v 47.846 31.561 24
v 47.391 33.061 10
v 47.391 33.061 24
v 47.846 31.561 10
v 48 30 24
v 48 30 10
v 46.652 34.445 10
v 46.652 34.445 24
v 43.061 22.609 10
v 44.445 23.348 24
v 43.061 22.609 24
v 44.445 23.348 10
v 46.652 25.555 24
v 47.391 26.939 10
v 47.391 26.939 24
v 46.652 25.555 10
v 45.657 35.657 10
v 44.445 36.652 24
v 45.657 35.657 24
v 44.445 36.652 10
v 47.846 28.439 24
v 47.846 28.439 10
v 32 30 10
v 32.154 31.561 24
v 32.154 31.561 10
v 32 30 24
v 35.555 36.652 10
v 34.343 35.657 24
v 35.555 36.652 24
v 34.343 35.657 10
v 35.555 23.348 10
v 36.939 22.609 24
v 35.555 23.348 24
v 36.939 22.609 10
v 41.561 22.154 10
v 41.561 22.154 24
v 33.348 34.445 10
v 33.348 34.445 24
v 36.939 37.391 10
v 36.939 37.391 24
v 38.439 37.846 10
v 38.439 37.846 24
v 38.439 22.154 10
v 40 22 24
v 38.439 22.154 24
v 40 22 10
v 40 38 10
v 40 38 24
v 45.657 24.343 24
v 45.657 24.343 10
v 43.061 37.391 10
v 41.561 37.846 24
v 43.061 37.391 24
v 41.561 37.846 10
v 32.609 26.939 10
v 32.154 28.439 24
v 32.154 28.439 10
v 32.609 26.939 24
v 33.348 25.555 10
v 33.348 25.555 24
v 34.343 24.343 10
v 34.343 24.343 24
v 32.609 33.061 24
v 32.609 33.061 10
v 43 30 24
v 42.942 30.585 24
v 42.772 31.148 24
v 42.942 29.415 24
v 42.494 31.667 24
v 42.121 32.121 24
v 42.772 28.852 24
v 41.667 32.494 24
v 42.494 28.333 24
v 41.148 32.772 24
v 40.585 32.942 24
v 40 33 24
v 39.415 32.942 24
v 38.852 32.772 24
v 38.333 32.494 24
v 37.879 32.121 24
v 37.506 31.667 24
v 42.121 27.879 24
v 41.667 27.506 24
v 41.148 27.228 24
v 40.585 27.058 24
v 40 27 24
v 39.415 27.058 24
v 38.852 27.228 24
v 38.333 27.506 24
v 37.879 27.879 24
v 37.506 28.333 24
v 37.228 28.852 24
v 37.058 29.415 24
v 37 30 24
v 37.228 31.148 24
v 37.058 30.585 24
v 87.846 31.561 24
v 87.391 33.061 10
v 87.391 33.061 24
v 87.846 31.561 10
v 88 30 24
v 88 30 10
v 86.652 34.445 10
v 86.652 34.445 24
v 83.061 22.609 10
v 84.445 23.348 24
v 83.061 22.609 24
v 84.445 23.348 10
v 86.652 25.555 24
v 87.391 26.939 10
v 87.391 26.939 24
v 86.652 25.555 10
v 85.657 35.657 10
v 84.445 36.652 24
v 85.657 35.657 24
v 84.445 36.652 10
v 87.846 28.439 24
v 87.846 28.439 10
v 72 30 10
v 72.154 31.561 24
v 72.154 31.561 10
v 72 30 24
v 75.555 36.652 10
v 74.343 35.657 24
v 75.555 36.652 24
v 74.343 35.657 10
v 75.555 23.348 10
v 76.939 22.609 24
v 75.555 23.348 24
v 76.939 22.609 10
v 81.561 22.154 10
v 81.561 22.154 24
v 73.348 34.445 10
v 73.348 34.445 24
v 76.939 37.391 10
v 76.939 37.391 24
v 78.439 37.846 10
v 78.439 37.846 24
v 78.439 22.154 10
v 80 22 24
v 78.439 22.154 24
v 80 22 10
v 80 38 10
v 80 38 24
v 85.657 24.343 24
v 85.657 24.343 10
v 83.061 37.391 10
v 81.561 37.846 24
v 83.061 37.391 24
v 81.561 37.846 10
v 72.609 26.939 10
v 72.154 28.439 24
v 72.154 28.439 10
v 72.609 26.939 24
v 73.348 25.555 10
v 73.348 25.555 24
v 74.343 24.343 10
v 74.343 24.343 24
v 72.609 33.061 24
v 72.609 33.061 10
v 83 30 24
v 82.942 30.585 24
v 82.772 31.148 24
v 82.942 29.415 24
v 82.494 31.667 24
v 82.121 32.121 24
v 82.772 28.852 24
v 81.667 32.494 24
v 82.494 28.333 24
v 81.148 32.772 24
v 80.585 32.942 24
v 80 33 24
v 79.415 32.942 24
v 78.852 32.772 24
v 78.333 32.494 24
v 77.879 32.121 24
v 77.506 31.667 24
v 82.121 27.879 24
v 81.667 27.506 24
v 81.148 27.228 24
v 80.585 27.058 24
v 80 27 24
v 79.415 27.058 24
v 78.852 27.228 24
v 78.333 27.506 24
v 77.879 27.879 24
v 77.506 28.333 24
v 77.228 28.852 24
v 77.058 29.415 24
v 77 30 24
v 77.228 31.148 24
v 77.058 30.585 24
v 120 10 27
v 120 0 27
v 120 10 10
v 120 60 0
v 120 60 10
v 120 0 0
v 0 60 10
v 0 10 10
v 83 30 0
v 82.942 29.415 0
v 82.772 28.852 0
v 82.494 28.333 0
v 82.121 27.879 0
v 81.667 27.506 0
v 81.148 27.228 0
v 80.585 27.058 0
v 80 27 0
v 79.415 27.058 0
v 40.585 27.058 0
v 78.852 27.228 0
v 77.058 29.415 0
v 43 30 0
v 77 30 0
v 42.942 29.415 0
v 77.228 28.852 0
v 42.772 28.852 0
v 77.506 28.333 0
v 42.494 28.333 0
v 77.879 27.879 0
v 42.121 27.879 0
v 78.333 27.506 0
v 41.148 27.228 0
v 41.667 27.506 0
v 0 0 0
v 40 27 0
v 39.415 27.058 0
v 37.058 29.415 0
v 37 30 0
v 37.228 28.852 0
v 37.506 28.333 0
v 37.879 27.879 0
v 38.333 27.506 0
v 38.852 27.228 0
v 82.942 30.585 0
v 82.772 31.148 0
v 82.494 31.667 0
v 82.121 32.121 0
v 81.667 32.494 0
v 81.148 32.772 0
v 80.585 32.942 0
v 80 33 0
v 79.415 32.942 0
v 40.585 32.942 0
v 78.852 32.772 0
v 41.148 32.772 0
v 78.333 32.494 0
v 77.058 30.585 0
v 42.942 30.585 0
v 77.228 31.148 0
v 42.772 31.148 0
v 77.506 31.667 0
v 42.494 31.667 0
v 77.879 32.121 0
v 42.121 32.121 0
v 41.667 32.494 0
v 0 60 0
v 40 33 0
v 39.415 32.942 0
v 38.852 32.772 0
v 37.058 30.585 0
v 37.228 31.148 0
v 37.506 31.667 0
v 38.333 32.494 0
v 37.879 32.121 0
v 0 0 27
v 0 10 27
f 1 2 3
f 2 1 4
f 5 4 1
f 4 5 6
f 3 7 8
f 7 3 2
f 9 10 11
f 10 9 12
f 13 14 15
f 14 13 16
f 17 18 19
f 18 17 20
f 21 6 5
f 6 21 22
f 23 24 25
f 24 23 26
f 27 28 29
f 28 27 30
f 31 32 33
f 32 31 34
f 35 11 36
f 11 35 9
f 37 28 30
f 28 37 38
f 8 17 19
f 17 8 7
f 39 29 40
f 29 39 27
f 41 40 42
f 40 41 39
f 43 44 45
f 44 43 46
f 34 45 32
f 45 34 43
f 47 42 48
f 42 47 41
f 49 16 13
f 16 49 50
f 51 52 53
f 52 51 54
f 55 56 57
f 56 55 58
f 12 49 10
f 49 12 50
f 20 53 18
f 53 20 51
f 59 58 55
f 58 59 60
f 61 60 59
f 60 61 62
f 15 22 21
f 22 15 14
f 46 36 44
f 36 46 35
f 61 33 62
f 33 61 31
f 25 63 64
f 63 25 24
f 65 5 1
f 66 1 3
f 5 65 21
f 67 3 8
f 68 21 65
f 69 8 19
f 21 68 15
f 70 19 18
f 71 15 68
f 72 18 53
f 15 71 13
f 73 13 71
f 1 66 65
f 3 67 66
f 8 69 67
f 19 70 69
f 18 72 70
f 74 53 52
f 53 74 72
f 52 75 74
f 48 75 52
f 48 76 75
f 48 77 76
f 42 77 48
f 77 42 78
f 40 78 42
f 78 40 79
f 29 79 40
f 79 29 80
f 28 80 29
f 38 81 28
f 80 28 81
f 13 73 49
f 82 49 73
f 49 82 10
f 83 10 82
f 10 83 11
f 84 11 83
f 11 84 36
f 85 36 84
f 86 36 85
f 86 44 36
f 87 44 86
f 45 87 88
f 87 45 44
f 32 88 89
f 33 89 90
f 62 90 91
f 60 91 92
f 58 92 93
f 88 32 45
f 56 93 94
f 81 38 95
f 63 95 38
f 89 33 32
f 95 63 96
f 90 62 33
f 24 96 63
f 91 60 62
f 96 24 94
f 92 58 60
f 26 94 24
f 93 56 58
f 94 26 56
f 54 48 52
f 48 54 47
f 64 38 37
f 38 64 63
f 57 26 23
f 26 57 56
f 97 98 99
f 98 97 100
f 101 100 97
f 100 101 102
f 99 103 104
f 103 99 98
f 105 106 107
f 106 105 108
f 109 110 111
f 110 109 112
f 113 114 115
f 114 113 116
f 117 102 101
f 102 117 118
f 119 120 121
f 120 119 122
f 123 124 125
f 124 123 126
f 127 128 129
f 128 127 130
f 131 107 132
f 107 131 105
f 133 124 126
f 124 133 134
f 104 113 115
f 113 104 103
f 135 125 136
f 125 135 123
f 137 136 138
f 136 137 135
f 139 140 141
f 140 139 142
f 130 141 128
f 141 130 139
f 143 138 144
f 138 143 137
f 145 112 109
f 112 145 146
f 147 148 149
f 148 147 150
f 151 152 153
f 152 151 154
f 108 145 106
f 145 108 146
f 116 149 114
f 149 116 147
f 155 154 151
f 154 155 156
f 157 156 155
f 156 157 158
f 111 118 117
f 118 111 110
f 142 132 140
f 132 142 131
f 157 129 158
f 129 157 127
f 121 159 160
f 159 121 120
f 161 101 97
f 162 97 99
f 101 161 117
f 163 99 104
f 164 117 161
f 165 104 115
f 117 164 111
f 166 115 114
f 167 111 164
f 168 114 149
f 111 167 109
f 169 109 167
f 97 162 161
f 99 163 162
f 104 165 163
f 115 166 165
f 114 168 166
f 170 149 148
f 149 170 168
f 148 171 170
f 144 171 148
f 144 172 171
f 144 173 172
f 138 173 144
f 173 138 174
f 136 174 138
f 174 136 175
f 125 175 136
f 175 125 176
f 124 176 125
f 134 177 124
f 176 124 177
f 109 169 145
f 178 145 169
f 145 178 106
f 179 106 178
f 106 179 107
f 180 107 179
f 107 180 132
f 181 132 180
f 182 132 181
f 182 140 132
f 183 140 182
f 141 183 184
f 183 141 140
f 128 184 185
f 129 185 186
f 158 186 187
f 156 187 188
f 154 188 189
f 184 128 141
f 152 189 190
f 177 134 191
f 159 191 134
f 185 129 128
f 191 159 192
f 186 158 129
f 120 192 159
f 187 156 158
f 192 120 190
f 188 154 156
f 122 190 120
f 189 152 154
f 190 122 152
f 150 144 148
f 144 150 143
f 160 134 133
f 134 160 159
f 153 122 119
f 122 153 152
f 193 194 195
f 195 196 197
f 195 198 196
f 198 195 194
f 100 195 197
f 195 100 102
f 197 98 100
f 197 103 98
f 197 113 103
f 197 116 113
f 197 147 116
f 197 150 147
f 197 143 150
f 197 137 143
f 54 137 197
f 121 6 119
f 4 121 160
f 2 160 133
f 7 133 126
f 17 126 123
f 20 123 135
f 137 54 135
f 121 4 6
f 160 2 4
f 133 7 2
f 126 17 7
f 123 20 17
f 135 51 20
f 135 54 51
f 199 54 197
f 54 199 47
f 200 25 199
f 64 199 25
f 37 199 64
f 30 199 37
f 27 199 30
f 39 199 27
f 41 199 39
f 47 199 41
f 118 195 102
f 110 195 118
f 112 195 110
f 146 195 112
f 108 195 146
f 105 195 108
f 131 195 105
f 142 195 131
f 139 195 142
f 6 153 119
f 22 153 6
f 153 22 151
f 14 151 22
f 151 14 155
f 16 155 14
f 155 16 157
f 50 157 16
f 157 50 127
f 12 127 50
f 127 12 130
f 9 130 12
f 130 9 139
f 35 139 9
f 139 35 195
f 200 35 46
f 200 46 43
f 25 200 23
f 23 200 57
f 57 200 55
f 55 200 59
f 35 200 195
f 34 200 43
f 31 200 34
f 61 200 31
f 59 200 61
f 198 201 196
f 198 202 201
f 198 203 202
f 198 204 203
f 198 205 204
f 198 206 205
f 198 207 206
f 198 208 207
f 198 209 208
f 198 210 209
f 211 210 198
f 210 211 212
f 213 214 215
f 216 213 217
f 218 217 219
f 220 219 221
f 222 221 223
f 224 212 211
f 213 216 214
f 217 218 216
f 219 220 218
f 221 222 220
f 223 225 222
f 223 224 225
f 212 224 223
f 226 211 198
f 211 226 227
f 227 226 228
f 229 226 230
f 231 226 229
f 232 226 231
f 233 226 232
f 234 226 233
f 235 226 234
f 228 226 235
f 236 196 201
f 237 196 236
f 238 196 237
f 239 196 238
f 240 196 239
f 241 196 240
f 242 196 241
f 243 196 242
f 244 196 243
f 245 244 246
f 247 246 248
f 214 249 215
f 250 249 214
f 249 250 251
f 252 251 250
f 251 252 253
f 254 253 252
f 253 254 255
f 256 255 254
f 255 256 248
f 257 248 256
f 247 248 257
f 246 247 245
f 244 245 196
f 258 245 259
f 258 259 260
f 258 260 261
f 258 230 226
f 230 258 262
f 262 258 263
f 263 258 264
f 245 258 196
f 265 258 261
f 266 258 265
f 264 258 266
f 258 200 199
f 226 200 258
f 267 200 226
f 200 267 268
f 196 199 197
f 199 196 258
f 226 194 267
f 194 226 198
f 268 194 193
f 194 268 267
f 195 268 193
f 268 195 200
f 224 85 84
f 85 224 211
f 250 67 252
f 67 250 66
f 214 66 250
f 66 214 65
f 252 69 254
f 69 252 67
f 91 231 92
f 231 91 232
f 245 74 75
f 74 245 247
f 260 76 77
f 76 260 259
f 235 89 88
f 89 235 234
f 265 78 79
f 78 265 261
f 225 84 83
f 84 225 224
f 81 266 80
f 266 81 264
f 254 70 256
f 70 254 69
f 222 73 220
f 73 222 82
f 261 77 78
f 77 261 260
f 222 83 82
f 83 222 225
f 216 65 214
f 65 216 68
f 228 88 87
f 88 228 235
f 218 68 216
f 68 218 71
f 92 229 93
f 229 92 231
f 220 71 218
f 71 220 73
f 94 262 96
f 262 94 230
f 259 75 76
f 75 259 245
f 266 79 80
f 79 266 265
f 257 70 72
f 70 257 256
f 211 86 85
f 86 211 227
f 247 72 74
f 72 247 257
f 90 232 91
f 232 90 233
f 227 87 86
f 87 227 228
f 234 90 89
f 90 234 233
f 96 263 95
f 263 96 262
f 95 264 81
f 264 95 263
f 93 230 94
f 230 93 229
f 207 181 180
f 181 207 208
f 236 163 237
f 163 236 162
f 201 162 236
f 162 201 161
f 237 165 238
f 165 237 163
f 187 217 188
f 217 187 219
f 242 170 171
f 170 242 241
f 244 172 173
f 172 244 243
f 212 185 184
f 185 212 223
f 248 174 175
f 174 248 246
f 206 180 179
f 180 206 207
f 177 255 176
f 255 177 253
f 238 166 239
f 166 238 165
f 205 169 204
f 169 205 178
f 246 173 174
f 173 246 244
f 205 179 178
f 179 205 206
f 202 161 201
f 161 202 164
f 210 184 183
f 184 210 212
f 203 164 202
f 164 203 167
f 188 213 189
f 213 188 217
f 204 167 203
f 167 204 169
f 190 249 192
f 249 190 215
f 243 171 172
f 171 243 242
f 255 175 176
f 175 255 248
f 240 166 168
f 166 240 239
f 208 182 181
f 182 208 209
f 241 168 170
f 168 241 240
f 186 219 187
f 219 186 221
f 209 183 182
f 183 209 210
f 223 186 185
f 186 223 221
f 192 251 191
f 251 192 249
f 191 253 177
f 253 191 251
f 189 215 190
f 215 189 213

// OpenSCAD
$fn = 32;

// ----------------------------------------------------------------------
// Drill jig: fence jig
// ----------------------------------------------------------------------

// --- parameters (mm) ---
plate_l = 120;            // plate length, X
plate_w = 60;             // plate width, Y
plate_t = 10;             // plate thickness
boss_d = 16;              // guide boss diameter
boss_h = 15;              // boss height above the plate
guide_d = 6;              // guide hole diameter
boss_pitch = 40;          // boss pitch
fence_h = 18;             // fence height above the plate
fence_t = 10;             // fence thickness

n_boss = 2;  // guide bosses
boss_x0 = (plate_l - (n_boss - 1) * boss_pitch) / 2;  // first boss X
boss_top = plate_t - 1 + boss_h;  // boss crown height
fence_top = plate_t - 1 + fence_h;  // fence crown height
total_h = max([fence_top, boss_top]);  // overall height

difference() {
  union() {
  cube([plate_l, plate_w, plate_t]);
  for (i = [0 : n_boss - 1])
    translate([boss_x0 + i * boss_pitch, plate_w / 2, plate_t - 1])
      cylinder(h = boss_h, d = boss_d);
  translate([0, 0, plate_t - 1]) cube([plate_l, fence_t, fence_h]);
  }
  for (i = [0 : n_boss - 1])
    translate([boss_x0 + i * boss_pitch, plate_w / 2, -1])
      cylinder(h = plate_t + boss_h, d = guide_d);
}
